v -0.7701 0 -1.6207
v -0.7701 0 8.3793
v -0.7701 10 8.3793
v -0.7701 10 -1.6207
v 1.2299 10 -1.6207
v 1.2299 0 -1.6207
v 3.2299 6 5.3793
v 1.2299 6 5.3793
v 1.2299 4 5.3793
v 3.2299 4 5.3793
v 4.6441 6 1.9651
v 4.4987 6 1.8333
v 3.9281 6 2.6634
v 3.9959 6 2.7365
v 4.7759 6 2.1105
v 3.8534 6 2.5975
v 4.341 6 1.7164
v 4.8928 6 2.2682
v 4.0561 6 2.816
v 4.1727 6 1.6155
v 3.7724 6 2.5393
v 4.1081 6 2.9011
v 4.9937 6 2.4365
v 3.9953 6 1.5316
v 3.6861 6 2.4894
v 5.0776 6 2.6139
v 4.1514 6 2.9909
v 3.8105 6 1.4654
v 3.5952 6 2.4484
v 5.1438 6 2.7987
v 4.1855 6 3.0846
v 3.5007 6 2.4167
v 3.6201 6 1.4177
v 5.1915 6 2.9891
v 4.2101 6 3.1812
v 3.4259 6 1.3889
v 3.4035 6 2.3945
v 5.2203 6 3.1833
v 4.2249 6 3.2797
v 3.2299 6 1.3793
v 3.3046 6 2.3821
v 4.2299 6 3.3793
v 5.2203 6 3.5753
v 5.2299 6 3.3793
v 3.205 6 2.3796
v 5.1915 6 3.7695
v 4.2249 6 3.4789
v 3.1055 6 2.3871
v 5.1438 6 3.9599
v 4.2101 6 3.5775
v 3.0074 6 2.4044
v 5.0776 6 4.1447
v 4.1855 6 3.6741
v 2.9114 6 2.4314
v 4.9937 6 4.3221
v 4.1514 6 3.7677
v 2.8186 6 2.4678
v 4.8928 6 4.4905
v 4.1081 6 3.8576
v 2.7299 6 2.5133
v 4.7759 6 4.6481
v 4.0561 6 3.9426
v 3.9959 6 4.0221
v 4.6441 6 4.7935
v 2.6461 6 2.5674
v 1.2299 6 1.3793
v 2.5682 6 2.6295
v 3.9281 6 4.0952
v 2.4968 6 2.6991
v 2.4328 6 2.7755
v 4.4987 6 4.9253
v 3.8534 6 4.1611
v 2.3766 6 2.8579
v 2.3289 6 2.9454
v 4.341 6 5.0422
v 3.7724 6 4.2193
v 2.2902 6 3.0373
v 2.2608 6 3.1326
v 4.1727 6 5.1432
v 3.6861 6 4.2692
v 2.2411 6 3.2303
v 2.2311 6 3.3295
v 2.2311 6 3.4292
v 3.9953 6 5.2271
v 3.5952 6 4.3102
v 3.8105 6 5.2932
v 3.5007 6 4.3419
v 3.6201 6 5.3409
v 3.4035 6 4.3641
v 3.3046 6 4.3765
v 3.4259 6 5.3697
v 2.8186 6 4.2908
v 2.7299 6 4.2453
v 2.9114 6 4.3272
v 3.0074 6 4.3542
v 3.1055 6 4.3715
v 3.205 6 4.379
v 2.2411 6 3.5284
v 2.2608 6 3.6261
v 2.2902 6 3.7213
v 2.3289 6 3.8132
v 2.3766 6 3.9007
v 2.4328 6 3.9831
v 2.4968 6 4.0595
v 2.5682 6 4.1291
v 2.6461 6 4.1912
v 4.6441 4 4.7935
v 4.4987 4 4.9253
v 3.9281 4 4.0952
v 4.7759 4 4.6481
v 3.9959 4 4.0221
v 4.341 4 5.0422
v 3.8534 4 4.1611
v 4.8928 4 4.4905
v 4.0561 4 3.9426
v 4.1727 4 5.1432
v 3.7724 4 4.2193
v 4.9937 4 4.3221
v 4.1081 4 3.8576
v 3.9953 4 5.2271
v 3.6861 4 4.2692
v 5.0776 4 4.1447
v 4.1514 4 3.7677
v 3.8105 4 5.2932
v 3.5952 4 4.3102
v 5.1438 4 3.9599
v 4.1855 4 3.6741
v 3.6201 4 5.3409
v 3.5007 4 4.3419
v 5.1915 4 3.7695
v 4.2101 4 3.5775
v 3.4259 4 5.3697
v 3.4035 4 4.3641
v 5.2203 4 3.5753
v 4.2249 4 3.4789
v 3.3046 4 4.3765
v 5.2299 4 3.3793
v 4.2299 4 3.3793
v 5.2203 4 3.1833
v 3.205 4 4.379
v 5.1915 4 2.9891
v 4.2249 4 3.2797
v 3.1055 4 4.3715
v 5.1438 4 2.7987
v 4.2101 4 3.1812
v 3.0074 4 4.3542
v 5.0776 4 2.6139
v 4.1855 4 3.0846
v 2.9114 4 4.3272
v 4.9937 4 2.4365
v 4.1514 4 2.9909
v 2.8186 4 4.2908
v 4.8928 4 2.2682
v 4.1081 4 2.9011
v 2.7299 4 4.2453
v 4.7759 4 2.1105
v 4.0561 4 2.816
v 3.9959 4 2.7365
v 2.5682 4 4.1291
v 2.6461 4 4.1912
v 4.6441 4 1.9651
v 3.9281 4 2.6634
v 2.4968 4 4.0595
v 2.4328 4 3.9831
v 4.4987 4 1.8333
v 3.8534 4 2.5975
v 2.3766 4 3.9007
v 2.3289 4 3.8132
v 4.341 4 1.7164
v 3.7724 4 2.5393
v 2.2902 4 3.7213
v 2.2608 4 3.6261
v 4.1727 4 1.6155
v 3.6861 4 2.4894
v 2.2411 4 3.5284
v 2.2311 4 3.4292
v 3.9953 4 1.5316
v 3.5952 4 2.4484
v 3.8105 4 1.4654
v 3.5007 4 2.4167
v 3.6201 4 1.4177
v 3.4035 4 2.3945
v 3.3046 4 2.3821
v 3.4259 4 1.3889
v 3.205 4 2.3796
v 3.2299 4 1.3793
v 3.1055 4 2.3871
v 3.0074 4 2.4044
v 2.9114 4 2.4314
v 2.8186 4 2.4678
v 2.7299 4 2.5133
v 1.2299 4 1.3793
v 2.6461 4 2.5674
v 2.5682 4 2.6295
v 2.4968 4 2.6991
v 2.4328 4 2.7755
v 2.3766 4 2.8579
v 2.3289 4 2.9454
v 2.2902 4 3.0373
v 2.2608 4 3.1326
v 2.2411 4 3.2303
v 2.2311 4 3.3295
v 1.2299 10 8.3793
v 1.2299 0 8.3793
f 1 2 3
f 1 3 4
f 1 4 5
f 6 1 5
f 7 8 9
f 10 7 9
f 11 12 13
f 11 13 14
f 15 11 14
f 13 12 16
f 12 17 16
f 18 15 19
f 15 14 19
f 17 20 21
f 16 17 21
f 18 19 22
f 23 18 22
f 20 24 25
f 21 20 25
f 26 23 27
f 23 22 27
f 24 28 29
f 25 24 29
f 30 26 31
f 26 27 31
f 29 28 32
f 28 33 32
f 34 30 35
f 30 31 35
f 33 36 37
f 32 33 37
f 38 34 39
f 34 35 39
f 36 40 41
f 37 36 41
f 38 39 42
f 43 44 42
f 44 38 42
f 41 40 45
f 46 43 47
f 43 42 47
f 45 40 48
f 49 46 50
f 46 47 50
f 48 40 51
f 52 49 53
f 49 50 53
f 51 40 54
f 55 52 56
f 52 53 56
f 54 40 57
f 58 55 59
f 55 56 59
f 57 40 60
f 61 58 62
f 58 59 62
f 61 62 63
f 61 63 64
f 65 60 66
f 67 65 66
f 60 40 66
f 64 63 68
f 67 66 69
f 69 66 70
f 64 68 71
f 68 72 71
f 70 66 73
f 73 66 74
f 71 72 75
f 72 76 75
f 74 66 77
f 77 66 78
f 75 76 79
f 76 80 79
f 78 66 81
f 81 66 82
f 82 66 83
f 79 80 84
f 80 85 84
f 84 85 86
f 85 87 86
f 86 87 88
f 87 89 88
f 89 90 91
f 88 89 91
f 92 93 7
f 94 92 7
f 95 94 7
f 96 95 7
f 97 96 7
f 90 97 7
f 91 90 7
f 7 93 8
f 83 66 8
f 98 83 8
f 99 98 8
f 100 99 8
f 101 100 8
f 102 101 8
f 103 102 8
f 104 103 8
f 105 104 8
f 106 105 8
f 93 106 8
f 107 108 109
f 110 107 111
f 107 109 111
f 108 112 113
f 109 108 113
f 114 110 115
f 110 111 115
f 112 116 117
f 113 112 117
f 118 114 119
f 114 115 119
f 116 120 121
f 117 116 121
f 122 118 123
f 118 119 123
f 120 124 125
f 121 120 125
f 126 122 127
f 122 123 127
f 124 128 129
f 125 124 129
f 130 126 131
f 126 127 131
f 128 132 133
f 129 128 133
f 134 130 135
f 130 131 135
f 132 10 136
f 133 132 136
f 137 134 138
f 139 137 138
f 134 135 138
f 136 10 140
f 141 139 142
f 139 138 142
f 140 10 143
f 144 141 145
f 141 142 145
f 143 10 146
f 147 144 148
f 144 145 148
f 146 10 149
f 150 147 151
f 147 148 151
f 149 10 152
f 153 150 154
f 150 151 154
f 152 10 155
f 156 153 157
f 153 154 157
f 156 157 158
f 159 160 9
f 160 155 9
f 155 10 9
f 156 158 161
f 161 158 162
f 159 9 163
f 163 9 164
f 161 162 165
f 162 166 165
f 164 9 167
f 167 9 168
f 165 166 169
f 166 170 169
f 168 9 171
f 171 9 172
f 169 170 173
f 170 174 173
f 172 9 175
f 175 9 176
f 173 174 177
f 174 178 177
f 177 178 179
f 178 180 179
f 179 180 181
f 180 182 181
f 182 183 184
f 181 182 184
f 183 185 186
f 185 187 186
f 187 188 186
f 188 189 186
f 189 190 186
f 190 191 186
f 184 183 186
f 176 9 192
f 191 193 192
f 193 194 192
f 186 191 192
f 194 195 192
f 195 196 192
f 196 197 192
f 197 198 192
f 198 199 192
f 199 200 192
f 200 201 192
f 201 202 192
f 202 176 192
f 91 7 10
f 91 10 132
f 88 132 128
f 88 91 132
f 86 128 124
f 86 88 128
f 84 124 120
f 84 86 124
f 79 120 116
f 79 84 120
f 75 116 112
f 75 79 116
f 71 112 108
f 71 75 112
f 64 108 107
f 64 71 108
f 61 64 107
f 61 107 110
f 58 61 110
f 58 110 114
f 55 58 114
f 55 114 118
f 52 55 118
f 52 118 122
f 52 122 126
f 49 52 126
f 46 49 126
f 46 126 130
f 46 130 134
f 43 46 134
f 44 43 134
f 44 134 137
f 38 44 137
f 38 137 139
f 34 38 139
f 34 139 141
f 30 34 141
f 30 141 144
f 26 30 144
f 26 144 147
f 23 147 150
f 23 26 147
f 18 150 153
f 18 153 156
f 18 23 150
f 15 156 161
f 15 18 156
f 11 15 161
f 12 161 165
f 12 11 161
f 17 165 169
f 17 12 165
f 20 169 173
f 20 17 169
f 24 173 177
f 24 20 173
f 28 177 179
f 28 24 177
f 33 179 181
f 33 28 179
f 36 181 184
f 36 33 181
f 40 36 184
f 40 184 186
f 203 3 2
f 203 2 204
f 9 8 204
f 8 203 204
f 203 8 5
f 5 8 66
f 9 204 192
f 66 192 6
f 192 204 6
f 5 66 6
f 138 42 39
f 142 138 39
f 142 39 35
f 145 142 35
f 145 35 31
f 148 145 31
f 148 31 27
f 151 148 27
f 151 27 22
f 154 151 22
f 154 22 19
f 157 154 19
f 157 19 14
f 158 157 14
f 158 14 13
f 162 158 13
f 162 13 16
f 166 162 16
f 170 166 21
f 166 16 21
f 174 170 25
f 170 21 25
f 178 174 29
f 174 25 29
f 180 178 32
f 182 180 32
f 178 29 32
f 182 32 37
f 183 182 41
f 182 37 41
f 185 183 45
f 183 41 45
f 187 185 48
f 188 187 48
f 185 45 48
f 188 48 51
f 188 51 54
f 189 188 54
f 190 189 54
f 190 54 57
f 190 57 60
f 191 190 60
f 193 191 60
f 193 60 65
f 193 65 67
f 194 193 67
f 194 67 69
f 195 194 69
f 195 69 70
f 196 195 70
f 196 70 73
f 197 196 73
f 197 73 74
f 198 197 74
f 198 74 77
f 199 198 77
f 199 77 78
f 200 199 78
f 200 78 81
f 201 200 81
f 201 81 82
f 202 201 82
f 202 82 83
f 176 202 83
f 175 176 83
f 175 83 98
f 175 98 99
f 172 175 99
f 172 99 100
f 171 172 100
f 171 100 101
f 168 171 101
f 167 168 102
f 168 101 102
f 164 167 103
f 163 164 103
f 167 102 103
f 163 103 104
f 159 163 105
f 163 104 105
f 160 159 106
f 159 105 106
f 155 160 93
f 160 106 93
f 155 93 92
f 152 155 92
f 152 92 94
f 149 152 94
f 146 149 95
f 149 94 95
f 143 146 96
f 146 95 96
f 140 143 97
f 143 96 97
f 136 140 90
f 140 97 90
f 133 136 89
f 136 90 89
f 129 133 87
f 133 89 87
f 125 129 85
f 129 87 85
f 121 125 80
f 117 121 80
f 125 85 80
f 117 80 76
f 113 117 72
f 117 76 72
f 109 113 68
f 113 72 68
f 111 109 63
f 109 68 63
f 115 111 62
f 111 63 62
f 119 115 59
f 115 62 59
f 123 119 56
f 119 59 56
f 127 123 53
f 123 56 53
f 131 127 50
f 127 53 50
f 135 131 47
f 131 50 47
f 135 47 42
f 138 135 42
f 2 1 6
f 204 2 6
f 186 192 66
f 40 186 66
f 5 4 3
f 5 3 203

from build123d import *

# Parameters (mm, degrees)
SKETCH1_W           = 2
SKETCH1_H           = 10
BOSS_EXTRUDE1_DEPTH = 10
BOSS_EXTRUDE2_DEPTH = 5
SKETCH3_R           = 1
CUT_EXTRUDE1_DEPTH  = 15


with BuildPart() as part:
    # Sketch1 → Boss-Extrude1 (new body)
    with BuildSketch(Plane(origin=(0, 0, 0), x_dir=(1, 0, 0), z_dir=(0, 1, 0))):
        with Locations((0.229885057, -3.379310345)):
            Rectangle(SKETCH1_W, SKETCH1_H)
    extrude(amount=BOSS_EXTRUDE1_DEPTH)

    # Sketch2 → Boss-Extrude2 (add)
    with BuildSketch(Plane(origin=(1.229885057, 0, 0), x_dir=(0, 0, -1), z_dir=(1, 0, 0))):
        Polygon((-2.379310345, 4), (-4.379310345, 6), (-5.379310345, 6), (-5.379310345, 4), align=None)
        Polygon((-1.379310345, 6), (-4.379310345, 6), (-2.379310345, 4), (-1.379310345, 4), align=None)
    extrude(amount=BOSS_EXTRUDE2_DEPTH)

    # Sketch3 → Cut-Extrude1 (cut)
    with BuildSketch(Plane(origin=(0, 6, 0), x_dir=(1, 0, 0), z_dir=(0, 1, 0))):
        with Locations((3.229885057, -3.379310345)):
            Circle(SKETCH3_R)
        with BuildLine():
            Line((3.229885057, -1.379310345), (6.229885057, -1.379310345))
            Line((6.229885057, -1.379310345), (6.229885057, -5.379310345))
            Line((6.229885057, -5.379310345), (3.229885057, -5.379310345))
            ThreePointArc((3.229885057, -5.379310345), (5.229885057, -3.379310345), (3.229885057, -1.379310345))
        make_face()
    extrude(amount=-CUT_EXTRUDE1_DEPTH, mode=Mode.SUBTRACT)


solid = part.part
